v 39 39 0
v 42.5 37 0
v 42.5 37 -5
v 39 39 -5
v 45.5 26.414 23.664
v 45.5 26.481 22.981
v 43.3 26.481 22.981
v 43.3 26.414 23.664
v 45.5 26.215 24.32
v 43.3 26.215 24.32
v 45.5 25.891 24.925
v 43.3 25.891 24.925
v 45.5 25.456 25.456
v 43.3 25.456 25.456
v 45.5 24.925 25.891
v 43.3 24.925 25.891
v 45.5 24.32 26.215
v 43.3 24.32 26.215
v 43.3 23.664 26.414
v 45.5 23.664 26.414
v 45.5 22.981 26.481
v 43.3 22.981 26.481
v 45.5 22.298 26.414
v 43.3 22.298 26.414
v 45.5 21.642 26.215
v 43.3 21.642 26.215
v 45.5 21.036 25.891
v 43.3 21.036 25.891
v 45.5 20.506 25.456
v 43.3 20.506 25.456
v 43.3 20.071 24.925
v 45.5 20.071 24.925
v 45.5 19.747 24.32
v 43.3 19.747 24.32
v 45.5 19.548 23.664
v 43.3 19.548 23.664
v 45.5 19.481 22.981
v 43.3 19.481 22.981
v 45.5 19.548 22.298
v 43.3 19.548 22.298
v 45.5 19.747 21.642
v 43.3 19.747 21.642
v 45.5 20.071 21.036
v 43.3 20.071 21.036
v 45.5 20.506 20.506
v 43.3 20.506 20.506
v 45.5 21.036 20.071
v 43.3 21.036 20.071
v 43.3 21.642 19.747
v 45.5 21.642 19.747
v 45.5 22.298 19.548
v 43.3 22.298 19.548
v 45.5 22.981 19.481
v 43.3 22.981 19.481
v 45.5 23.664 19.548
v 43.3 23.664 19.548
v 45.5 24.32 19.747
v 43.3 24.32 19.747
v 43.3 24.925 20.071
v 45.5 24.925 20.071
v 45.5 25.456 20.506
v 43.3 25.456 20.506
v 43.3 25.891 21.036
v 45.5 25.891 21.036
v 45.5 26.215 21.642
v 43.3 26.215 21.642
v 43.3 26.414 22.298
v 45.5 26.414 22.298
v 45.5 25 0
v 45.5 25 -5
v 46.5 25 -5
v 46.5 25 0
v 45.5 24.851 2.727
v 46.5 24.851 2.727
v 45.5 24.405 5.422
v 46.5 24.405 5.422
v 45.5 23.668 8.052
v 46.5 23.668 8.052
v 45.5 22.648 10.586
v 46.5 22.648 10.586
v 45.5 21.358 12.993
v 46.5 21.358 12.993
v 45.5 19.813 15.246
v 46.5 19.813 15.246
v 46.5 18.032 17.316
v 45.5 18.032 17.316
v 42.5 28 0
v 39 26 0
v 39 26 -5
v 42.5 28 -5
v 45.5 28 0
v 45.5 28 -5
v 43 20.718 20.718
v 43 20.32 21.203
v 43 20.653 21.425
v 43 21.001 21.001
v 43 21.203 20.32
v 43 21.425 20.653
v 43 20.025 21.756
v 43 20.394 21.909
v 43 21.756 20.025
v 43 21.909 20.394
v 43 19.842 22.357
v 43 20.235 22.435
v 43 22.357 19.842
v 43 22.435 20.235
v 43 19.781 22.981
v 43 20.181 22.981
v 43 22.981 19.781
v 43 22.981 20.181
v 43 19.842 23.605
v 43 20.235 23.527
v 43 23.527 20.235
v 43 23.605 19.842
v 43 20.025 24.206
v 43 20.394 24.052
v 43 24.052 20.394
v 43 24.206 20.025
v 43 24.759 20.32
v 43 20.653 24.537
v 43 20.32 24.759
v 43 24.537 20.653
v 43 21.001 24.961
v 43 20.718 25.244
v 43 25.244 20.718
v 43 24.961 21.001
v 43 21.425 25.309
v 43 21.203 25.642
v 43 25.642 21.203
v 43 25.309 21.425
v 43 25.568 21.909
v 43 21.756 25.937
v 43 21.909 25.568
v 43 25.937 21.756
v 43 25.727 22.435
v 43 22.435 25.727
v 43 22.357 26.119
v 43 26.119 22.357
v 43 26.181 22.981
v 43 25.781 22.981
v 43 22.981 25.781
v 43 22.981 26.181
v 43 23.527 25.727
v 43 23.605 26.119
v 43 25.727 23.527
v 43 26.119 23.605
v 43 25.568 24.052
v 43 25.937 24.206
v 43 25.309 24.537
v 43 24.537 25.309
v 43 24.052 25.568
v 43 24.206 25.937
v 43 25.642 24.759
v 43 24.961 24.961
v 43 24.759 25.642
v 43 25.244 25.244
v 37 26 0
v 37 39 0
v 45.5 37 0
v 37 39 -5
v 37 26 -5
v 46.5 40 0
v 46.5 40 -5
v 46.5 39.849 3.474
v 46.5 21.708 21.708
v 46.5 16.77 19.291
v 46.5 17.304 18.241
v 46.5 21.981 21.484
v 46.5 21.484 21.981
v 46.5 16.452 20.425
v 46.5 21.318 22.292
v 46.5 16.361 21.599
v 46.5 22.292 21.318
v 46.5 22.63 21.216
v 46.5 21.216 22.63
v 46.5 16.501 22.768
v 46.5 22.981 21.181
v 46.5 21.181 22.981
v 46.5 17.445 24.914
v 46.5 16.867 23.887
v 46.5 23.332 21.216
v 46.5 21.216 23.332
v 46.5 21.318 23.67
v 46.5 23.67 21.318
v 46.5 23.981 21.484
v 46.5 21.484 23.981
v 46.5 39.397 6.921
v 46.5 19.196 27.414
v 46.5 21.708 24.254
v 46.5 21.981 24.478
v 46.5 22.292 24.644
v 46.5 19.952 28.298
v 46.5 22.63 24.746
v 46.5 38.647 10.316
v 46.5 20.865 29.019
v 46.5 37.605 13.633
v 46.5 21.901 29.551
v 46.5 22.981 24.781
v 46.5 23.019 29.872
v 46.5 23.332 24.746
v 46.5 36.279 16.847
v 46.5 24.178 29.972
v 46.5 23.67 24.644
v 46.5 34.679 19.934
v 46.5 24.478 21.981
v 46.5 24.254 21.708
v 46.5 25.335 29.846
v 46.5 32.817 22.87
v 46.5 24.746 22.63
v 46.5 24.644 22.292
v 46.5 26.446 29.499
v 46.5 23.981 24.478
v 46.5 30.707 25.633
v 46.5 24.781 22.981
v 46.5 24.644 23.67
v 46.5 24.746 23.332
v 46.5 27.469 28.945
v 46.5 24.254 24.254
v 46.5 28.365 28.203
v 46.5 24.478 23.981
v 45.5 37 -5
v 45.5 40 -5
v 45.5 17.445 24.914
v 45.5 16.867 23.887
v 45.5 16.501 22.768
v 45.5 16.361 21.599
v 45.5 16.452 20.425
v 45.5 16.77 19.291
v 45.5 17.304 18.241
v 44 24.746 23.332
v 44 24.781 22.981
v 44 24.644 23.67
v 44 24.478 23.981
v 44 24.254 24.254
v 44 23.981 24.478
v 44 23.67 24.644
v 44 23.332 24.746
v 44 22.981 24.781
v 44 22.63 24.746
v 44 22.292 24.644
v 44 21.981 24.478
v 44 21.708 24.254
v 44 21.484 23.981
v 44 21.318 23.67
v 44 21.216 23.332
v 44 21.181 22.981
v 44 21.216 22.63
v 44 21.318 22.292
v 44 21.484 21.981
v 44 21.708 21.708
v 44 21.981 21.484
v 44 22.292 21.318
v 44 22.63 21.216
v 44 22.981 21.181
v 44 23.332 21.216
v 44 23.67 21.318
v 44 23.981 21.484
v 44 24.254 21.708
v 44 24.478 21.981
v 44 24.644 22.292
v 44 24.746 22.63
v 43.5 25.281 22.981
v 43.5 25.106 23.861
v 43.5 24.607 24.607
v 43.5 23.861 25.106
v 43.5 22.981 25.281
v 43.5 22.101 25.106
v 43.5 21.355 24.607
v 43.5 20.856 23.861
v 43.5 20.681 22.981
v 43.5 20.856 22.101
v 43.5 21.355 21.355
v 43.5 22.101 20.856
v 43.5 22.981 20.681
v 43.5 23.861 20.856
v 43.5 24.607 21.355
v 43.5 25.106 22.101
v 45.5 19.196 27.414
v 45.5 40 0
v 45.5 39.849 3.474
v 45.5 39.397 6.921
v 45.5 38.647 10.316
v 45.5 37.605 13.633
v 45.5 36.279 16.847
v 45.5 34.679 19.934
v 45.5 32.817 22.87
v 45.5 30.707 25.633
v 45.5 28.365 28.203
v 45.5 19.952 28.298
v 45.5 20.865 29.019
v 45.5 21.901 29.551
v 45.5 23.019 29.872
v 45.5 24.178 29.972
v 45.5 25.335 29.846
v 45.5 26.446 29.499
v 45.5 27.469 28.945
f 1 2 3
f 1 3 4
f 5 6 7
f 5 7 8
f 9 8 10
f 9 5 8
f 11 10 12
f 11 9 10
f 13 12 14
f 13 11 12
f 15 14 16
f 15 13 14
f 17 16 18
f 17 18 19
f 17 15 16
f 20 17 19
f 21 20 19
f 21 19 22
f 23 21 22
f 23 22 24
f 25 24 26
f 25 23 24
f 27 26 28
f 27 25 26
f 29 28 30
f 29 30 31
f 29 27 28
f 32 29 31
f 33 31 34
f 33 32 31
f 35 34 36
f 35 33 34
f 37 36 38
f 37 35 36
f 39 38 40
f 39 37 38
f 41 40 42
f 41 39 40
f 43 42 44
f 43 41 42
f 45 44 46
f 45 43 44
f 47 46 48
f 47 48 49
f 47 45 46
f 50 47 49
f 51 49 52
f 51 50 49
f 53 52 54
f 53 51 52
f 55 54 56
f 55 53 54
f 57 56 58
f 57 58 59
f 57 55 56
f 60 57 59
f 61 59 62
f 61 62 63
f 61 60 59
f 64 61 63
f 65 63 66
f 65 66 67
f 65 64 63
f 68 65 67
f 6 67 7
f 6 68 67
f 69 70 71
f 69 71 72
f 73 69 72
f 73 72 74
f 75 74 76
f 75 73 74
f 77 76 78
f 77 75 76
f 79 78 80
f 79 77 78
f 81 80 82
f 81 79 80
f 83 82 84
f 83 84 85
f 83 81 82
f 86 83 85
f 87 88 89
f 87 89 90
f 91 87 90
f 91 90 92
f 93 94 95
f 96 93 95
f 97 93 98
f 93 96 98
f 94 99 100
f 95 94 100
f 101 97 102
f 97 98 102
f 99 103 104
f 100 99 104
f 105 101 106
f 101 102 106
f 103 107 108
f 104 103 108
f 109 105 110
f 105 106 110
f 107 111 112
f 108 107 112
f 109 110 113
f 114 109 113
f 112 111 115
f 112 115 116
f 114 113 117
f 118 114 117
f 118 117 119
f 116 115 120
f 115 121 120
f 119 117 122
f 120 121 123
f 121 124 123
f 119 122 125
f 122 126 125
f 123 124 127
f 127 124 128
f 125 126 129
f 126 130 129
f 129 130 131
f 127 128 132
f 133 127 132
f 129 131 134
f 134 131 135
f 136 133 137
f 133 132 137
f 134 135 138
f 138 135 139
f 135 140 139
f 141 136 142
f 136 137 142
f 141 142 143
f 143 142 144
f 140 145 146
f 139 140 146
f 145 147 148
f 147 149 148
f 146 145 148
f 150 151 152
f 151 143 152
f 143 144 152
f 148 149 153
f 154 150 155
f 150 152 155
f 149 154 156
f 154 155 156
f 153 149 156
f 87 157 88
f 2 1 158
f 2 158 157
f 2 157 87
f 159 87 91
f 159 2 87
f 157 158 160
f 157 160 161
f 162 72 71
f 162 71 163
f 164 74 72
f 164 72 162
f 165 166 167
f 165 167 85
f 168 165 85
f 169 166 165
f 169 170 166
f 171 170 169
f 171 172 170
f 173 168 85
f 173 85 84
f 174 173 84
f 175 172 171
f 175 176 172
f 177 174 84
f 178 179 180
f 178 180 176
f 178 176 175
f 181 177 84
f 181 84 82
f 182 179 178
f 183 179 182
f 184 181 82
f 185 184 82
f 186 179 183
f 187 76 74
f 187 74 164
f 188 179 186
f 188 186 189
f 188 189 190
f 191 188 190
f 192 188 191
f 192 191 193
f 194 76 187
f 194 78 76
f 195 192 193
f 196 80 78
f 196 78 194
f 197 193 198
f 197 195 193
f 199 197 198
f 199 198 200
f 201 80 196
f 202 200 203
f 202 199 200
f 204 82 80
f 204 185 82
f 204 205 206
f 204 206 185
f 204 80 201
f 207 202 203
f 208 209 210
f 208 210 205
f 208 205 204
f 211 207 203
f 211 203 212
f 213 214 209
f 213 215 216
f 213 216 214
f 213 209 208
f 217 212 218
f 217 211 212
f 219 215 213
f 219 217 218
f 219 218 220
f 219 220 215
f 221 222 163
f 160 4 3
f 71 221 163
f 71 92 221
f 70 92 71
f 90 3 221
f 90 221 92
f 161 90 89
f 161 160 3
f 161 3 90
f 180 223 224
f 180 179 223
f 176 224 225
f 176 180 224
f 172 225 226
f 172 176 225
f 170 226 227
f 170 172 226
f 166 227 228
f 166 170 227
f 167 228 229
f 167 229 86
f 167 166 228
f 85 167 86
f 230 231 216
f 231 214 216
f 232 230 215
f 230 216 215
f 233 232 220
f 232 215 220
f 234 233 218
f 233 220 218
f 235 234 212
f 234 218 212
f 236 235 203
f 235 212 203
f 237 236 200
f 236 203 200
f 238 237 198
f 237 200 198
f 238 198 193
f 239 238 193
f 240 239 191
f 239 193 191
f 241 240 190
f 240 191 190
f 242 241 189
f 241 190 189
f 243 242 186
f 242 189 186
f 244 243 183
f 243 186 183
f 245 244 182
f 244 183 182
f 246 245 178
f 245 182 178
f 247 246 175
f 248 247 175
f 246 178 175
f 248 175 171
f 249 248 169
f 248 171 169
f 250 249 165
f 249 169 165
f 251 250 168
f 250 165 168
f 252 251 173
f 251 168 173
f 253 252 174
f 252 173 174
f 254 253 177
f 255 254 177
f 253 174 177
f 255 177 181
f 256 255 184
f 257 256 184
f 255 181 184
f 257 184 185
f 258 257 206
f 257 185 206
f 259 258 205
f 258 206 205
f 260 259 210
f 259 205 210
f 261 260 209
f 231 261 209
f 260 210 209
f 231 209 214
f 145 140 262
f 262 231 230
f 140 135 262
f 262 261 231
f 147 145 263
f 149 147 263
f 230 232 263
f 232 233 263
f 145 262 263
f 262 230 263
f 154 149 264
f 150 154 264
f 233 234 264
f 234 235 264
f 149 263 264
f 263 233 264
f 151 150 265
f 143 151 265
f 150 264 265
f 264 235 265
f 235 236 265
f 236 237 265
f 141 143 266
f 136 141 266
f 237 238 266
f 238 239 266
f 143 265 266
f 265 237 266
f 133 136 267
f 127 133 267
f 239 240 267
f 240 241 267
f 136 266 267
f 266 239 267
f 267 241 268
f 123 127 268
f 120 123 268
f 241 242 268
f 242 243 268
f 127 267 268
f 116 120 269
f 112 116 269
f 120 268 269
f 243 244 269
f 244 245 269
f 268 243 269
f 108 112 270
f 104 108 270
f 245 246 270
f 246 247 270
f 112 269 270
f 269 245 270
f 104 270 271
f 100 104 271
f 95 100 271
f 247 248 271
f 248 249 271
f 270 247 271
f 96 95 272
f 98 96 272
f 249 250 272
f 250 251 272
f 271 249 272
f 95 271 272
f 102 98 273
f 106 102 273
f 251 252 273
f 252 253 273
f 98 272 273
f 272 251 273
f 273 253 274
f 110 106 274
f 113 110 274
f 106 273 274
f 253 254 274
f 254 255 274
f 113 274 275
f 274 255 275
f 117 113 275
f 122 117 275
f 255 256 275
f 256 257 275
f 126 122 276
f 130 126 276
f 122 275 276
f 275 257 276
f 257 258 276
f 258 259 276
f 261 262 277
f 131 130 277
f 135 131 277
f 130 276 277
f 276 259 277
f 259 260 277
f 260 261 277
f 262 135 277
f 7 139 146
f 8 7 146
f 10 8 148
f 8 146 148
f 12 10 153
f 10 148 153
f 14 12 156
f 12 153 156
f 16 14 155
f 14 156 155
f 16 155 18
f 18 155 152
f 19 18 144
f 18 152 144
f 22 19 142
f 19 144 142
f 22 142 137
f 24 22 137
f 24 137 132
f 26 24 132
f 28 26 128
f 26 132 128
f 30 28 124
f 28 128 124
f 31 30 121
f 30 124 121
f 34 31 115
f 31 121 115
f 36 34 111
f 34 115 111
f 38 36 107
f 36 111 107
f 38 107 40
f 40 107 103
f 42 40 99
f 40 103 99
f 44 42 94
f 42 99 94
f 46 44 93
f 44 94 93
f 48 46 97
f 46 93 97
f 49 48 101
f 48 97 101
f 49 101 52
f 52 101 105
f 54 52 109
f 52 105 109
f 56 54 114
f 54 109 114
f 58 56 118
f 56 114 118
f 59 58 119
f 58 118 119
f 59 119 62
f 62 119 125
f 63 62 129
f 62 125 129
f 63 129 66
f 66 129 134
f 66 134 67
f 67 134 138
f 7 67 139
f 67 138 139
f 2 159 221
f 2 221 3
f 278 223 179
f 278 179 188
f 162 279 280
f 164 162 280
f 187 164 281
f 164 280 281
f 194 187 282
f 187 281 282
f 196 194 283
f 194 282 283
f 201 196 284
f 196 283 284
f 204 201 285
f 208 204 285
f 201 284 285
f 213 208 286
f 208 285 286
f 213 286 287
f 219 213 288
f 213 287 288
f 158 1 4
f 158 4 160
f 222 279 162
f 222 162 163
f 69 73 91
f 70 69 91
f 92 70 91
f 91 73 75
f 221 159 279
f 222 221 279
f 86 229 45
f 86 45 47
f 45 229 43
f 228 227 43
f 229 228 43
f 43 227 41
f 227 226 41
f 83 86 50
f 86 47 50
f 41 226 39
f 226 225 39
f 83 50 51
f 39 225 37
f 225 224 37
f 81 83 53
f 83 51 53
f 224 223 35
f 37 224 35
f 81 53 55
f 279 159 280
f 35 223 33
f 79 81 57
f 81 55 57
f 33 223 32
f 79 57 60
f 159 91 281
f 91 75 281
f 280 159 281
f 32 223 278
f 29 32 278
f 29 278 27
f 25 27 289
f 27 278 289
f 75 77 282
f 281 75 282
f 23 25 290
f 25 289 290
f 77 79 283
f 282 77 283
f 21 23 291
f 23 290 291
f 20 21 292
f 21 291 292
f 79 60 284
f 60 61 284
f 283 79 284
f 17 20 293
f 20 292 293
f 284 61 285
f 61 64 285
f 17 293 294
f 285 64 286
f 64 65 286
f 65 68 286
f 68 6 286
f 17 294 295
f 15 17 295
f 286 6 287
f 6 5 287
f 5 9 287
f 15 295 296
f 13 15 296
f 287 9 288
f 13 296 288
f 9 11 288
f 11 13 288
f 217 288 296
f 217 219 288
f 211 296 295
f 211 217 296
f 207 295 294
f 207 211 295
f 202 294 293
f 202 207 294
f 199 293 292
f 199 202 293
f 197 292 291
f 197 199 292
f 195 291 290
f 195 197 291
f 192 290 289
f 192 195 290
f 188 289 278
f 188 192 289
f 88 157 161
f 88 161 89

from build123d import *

# Parameters (mm, degrees)
PAD030_DEPTH         = 1
SKETCH054_R          = 3.5
PAD031_DEPTH         = 2.5
PAD032_DEPTH         = 5
SKETCH056_R          = 1.8
POCKET018_DEPTH      = 1.501
POCKET018_DEPTH_BACK = 8.001
CHAMFER005_SIZE      = 1
FILLET001_R          = 6
CHAMFER006_SIZE      = 0.3


with BuildPart() as part:
    # Sketch053 → Pad030 (new body)
    with BuildSketch(Plane.YZ.offset(45.5)):
        with BuildLine():
            ThreePointArc((40, 0), (35.4804333271, 18.4699445294), (22.943057454, 32.7660817716))
            Line((14.3394109088, 20.4788011072), (22.943057454, 32.7660817716))
            ThreePointArc((25, 0), (22.1752708295, 11.5437153309), (14.3394109088, 20.4788011072))
            Line((25, -5), (25, 0))
            Line((40, -5), (25, -5))
            Line((40, 0), (40, -5))
        make_face()
    extrude(amount=PAD030_DEPTH)

    # Sketch054 → Pad031 (join)
    with BuildSketch(Plane.YZ.offset(45.5)):
        with Locations((22.9809703886, 22.9809703886)):
            Circle(SKETCH054_R)
    extrude(amount=-PAD031_DEPTH)

    # Sketch055 → Pad032 (join)
    with BuildSketch(Plane.XY):
        Polygon((39, 39), (37, 39), (37, 26), (39, 26), (42.5, 28), (45.5, 28), (45.5, 37), (42.5, 37), align=None)
    extrude(amount=-PAD032_DEPTH)

    # Sketch056 → Pocket018 (cut, two sides)
    with BuildSketch(Plane.YZ.offset(45)) as pocket018_sk:
        with Locations((22.9809703886, 22.9809703886)):
            Circle(SKETCH056_R)
    extrude(amount=POCKET018_DEPTH, mode=Mode.SUBTRACT)
    extrude(pocket018_sk.sketch, amount=-POCKET018_DEPTH_BACK, mode=Mode.SUBTRACT)

    # Chamfer005
    chamfer005_edges = [part.edges().sort_by_distance(p)[0] for p in [
        (43, 21.18097, 22.98097),
    ]]
    chamfer(chamfer005_edges, length=CHAMFER005_SIZE)

    # Fillet001
    fillet001_edges = [part.edges().sort_by_distance(p)[0] for p in [
        (46, 14.339411, 20.478801),
        (46, 22.943057, 32.766082),
    ]]
    fillet(fillet001_edges, radius=FILLET001_R)

    # Chamfer006
    chamfer006_edges = [part.edges().sort_by_distance(p)[0] for p in [
        (43, 19.48097, 22.98097),
    ]]
    chamfer(chamfer006_edges, length=CHAMFER006_SIZE)


solid = part.part
